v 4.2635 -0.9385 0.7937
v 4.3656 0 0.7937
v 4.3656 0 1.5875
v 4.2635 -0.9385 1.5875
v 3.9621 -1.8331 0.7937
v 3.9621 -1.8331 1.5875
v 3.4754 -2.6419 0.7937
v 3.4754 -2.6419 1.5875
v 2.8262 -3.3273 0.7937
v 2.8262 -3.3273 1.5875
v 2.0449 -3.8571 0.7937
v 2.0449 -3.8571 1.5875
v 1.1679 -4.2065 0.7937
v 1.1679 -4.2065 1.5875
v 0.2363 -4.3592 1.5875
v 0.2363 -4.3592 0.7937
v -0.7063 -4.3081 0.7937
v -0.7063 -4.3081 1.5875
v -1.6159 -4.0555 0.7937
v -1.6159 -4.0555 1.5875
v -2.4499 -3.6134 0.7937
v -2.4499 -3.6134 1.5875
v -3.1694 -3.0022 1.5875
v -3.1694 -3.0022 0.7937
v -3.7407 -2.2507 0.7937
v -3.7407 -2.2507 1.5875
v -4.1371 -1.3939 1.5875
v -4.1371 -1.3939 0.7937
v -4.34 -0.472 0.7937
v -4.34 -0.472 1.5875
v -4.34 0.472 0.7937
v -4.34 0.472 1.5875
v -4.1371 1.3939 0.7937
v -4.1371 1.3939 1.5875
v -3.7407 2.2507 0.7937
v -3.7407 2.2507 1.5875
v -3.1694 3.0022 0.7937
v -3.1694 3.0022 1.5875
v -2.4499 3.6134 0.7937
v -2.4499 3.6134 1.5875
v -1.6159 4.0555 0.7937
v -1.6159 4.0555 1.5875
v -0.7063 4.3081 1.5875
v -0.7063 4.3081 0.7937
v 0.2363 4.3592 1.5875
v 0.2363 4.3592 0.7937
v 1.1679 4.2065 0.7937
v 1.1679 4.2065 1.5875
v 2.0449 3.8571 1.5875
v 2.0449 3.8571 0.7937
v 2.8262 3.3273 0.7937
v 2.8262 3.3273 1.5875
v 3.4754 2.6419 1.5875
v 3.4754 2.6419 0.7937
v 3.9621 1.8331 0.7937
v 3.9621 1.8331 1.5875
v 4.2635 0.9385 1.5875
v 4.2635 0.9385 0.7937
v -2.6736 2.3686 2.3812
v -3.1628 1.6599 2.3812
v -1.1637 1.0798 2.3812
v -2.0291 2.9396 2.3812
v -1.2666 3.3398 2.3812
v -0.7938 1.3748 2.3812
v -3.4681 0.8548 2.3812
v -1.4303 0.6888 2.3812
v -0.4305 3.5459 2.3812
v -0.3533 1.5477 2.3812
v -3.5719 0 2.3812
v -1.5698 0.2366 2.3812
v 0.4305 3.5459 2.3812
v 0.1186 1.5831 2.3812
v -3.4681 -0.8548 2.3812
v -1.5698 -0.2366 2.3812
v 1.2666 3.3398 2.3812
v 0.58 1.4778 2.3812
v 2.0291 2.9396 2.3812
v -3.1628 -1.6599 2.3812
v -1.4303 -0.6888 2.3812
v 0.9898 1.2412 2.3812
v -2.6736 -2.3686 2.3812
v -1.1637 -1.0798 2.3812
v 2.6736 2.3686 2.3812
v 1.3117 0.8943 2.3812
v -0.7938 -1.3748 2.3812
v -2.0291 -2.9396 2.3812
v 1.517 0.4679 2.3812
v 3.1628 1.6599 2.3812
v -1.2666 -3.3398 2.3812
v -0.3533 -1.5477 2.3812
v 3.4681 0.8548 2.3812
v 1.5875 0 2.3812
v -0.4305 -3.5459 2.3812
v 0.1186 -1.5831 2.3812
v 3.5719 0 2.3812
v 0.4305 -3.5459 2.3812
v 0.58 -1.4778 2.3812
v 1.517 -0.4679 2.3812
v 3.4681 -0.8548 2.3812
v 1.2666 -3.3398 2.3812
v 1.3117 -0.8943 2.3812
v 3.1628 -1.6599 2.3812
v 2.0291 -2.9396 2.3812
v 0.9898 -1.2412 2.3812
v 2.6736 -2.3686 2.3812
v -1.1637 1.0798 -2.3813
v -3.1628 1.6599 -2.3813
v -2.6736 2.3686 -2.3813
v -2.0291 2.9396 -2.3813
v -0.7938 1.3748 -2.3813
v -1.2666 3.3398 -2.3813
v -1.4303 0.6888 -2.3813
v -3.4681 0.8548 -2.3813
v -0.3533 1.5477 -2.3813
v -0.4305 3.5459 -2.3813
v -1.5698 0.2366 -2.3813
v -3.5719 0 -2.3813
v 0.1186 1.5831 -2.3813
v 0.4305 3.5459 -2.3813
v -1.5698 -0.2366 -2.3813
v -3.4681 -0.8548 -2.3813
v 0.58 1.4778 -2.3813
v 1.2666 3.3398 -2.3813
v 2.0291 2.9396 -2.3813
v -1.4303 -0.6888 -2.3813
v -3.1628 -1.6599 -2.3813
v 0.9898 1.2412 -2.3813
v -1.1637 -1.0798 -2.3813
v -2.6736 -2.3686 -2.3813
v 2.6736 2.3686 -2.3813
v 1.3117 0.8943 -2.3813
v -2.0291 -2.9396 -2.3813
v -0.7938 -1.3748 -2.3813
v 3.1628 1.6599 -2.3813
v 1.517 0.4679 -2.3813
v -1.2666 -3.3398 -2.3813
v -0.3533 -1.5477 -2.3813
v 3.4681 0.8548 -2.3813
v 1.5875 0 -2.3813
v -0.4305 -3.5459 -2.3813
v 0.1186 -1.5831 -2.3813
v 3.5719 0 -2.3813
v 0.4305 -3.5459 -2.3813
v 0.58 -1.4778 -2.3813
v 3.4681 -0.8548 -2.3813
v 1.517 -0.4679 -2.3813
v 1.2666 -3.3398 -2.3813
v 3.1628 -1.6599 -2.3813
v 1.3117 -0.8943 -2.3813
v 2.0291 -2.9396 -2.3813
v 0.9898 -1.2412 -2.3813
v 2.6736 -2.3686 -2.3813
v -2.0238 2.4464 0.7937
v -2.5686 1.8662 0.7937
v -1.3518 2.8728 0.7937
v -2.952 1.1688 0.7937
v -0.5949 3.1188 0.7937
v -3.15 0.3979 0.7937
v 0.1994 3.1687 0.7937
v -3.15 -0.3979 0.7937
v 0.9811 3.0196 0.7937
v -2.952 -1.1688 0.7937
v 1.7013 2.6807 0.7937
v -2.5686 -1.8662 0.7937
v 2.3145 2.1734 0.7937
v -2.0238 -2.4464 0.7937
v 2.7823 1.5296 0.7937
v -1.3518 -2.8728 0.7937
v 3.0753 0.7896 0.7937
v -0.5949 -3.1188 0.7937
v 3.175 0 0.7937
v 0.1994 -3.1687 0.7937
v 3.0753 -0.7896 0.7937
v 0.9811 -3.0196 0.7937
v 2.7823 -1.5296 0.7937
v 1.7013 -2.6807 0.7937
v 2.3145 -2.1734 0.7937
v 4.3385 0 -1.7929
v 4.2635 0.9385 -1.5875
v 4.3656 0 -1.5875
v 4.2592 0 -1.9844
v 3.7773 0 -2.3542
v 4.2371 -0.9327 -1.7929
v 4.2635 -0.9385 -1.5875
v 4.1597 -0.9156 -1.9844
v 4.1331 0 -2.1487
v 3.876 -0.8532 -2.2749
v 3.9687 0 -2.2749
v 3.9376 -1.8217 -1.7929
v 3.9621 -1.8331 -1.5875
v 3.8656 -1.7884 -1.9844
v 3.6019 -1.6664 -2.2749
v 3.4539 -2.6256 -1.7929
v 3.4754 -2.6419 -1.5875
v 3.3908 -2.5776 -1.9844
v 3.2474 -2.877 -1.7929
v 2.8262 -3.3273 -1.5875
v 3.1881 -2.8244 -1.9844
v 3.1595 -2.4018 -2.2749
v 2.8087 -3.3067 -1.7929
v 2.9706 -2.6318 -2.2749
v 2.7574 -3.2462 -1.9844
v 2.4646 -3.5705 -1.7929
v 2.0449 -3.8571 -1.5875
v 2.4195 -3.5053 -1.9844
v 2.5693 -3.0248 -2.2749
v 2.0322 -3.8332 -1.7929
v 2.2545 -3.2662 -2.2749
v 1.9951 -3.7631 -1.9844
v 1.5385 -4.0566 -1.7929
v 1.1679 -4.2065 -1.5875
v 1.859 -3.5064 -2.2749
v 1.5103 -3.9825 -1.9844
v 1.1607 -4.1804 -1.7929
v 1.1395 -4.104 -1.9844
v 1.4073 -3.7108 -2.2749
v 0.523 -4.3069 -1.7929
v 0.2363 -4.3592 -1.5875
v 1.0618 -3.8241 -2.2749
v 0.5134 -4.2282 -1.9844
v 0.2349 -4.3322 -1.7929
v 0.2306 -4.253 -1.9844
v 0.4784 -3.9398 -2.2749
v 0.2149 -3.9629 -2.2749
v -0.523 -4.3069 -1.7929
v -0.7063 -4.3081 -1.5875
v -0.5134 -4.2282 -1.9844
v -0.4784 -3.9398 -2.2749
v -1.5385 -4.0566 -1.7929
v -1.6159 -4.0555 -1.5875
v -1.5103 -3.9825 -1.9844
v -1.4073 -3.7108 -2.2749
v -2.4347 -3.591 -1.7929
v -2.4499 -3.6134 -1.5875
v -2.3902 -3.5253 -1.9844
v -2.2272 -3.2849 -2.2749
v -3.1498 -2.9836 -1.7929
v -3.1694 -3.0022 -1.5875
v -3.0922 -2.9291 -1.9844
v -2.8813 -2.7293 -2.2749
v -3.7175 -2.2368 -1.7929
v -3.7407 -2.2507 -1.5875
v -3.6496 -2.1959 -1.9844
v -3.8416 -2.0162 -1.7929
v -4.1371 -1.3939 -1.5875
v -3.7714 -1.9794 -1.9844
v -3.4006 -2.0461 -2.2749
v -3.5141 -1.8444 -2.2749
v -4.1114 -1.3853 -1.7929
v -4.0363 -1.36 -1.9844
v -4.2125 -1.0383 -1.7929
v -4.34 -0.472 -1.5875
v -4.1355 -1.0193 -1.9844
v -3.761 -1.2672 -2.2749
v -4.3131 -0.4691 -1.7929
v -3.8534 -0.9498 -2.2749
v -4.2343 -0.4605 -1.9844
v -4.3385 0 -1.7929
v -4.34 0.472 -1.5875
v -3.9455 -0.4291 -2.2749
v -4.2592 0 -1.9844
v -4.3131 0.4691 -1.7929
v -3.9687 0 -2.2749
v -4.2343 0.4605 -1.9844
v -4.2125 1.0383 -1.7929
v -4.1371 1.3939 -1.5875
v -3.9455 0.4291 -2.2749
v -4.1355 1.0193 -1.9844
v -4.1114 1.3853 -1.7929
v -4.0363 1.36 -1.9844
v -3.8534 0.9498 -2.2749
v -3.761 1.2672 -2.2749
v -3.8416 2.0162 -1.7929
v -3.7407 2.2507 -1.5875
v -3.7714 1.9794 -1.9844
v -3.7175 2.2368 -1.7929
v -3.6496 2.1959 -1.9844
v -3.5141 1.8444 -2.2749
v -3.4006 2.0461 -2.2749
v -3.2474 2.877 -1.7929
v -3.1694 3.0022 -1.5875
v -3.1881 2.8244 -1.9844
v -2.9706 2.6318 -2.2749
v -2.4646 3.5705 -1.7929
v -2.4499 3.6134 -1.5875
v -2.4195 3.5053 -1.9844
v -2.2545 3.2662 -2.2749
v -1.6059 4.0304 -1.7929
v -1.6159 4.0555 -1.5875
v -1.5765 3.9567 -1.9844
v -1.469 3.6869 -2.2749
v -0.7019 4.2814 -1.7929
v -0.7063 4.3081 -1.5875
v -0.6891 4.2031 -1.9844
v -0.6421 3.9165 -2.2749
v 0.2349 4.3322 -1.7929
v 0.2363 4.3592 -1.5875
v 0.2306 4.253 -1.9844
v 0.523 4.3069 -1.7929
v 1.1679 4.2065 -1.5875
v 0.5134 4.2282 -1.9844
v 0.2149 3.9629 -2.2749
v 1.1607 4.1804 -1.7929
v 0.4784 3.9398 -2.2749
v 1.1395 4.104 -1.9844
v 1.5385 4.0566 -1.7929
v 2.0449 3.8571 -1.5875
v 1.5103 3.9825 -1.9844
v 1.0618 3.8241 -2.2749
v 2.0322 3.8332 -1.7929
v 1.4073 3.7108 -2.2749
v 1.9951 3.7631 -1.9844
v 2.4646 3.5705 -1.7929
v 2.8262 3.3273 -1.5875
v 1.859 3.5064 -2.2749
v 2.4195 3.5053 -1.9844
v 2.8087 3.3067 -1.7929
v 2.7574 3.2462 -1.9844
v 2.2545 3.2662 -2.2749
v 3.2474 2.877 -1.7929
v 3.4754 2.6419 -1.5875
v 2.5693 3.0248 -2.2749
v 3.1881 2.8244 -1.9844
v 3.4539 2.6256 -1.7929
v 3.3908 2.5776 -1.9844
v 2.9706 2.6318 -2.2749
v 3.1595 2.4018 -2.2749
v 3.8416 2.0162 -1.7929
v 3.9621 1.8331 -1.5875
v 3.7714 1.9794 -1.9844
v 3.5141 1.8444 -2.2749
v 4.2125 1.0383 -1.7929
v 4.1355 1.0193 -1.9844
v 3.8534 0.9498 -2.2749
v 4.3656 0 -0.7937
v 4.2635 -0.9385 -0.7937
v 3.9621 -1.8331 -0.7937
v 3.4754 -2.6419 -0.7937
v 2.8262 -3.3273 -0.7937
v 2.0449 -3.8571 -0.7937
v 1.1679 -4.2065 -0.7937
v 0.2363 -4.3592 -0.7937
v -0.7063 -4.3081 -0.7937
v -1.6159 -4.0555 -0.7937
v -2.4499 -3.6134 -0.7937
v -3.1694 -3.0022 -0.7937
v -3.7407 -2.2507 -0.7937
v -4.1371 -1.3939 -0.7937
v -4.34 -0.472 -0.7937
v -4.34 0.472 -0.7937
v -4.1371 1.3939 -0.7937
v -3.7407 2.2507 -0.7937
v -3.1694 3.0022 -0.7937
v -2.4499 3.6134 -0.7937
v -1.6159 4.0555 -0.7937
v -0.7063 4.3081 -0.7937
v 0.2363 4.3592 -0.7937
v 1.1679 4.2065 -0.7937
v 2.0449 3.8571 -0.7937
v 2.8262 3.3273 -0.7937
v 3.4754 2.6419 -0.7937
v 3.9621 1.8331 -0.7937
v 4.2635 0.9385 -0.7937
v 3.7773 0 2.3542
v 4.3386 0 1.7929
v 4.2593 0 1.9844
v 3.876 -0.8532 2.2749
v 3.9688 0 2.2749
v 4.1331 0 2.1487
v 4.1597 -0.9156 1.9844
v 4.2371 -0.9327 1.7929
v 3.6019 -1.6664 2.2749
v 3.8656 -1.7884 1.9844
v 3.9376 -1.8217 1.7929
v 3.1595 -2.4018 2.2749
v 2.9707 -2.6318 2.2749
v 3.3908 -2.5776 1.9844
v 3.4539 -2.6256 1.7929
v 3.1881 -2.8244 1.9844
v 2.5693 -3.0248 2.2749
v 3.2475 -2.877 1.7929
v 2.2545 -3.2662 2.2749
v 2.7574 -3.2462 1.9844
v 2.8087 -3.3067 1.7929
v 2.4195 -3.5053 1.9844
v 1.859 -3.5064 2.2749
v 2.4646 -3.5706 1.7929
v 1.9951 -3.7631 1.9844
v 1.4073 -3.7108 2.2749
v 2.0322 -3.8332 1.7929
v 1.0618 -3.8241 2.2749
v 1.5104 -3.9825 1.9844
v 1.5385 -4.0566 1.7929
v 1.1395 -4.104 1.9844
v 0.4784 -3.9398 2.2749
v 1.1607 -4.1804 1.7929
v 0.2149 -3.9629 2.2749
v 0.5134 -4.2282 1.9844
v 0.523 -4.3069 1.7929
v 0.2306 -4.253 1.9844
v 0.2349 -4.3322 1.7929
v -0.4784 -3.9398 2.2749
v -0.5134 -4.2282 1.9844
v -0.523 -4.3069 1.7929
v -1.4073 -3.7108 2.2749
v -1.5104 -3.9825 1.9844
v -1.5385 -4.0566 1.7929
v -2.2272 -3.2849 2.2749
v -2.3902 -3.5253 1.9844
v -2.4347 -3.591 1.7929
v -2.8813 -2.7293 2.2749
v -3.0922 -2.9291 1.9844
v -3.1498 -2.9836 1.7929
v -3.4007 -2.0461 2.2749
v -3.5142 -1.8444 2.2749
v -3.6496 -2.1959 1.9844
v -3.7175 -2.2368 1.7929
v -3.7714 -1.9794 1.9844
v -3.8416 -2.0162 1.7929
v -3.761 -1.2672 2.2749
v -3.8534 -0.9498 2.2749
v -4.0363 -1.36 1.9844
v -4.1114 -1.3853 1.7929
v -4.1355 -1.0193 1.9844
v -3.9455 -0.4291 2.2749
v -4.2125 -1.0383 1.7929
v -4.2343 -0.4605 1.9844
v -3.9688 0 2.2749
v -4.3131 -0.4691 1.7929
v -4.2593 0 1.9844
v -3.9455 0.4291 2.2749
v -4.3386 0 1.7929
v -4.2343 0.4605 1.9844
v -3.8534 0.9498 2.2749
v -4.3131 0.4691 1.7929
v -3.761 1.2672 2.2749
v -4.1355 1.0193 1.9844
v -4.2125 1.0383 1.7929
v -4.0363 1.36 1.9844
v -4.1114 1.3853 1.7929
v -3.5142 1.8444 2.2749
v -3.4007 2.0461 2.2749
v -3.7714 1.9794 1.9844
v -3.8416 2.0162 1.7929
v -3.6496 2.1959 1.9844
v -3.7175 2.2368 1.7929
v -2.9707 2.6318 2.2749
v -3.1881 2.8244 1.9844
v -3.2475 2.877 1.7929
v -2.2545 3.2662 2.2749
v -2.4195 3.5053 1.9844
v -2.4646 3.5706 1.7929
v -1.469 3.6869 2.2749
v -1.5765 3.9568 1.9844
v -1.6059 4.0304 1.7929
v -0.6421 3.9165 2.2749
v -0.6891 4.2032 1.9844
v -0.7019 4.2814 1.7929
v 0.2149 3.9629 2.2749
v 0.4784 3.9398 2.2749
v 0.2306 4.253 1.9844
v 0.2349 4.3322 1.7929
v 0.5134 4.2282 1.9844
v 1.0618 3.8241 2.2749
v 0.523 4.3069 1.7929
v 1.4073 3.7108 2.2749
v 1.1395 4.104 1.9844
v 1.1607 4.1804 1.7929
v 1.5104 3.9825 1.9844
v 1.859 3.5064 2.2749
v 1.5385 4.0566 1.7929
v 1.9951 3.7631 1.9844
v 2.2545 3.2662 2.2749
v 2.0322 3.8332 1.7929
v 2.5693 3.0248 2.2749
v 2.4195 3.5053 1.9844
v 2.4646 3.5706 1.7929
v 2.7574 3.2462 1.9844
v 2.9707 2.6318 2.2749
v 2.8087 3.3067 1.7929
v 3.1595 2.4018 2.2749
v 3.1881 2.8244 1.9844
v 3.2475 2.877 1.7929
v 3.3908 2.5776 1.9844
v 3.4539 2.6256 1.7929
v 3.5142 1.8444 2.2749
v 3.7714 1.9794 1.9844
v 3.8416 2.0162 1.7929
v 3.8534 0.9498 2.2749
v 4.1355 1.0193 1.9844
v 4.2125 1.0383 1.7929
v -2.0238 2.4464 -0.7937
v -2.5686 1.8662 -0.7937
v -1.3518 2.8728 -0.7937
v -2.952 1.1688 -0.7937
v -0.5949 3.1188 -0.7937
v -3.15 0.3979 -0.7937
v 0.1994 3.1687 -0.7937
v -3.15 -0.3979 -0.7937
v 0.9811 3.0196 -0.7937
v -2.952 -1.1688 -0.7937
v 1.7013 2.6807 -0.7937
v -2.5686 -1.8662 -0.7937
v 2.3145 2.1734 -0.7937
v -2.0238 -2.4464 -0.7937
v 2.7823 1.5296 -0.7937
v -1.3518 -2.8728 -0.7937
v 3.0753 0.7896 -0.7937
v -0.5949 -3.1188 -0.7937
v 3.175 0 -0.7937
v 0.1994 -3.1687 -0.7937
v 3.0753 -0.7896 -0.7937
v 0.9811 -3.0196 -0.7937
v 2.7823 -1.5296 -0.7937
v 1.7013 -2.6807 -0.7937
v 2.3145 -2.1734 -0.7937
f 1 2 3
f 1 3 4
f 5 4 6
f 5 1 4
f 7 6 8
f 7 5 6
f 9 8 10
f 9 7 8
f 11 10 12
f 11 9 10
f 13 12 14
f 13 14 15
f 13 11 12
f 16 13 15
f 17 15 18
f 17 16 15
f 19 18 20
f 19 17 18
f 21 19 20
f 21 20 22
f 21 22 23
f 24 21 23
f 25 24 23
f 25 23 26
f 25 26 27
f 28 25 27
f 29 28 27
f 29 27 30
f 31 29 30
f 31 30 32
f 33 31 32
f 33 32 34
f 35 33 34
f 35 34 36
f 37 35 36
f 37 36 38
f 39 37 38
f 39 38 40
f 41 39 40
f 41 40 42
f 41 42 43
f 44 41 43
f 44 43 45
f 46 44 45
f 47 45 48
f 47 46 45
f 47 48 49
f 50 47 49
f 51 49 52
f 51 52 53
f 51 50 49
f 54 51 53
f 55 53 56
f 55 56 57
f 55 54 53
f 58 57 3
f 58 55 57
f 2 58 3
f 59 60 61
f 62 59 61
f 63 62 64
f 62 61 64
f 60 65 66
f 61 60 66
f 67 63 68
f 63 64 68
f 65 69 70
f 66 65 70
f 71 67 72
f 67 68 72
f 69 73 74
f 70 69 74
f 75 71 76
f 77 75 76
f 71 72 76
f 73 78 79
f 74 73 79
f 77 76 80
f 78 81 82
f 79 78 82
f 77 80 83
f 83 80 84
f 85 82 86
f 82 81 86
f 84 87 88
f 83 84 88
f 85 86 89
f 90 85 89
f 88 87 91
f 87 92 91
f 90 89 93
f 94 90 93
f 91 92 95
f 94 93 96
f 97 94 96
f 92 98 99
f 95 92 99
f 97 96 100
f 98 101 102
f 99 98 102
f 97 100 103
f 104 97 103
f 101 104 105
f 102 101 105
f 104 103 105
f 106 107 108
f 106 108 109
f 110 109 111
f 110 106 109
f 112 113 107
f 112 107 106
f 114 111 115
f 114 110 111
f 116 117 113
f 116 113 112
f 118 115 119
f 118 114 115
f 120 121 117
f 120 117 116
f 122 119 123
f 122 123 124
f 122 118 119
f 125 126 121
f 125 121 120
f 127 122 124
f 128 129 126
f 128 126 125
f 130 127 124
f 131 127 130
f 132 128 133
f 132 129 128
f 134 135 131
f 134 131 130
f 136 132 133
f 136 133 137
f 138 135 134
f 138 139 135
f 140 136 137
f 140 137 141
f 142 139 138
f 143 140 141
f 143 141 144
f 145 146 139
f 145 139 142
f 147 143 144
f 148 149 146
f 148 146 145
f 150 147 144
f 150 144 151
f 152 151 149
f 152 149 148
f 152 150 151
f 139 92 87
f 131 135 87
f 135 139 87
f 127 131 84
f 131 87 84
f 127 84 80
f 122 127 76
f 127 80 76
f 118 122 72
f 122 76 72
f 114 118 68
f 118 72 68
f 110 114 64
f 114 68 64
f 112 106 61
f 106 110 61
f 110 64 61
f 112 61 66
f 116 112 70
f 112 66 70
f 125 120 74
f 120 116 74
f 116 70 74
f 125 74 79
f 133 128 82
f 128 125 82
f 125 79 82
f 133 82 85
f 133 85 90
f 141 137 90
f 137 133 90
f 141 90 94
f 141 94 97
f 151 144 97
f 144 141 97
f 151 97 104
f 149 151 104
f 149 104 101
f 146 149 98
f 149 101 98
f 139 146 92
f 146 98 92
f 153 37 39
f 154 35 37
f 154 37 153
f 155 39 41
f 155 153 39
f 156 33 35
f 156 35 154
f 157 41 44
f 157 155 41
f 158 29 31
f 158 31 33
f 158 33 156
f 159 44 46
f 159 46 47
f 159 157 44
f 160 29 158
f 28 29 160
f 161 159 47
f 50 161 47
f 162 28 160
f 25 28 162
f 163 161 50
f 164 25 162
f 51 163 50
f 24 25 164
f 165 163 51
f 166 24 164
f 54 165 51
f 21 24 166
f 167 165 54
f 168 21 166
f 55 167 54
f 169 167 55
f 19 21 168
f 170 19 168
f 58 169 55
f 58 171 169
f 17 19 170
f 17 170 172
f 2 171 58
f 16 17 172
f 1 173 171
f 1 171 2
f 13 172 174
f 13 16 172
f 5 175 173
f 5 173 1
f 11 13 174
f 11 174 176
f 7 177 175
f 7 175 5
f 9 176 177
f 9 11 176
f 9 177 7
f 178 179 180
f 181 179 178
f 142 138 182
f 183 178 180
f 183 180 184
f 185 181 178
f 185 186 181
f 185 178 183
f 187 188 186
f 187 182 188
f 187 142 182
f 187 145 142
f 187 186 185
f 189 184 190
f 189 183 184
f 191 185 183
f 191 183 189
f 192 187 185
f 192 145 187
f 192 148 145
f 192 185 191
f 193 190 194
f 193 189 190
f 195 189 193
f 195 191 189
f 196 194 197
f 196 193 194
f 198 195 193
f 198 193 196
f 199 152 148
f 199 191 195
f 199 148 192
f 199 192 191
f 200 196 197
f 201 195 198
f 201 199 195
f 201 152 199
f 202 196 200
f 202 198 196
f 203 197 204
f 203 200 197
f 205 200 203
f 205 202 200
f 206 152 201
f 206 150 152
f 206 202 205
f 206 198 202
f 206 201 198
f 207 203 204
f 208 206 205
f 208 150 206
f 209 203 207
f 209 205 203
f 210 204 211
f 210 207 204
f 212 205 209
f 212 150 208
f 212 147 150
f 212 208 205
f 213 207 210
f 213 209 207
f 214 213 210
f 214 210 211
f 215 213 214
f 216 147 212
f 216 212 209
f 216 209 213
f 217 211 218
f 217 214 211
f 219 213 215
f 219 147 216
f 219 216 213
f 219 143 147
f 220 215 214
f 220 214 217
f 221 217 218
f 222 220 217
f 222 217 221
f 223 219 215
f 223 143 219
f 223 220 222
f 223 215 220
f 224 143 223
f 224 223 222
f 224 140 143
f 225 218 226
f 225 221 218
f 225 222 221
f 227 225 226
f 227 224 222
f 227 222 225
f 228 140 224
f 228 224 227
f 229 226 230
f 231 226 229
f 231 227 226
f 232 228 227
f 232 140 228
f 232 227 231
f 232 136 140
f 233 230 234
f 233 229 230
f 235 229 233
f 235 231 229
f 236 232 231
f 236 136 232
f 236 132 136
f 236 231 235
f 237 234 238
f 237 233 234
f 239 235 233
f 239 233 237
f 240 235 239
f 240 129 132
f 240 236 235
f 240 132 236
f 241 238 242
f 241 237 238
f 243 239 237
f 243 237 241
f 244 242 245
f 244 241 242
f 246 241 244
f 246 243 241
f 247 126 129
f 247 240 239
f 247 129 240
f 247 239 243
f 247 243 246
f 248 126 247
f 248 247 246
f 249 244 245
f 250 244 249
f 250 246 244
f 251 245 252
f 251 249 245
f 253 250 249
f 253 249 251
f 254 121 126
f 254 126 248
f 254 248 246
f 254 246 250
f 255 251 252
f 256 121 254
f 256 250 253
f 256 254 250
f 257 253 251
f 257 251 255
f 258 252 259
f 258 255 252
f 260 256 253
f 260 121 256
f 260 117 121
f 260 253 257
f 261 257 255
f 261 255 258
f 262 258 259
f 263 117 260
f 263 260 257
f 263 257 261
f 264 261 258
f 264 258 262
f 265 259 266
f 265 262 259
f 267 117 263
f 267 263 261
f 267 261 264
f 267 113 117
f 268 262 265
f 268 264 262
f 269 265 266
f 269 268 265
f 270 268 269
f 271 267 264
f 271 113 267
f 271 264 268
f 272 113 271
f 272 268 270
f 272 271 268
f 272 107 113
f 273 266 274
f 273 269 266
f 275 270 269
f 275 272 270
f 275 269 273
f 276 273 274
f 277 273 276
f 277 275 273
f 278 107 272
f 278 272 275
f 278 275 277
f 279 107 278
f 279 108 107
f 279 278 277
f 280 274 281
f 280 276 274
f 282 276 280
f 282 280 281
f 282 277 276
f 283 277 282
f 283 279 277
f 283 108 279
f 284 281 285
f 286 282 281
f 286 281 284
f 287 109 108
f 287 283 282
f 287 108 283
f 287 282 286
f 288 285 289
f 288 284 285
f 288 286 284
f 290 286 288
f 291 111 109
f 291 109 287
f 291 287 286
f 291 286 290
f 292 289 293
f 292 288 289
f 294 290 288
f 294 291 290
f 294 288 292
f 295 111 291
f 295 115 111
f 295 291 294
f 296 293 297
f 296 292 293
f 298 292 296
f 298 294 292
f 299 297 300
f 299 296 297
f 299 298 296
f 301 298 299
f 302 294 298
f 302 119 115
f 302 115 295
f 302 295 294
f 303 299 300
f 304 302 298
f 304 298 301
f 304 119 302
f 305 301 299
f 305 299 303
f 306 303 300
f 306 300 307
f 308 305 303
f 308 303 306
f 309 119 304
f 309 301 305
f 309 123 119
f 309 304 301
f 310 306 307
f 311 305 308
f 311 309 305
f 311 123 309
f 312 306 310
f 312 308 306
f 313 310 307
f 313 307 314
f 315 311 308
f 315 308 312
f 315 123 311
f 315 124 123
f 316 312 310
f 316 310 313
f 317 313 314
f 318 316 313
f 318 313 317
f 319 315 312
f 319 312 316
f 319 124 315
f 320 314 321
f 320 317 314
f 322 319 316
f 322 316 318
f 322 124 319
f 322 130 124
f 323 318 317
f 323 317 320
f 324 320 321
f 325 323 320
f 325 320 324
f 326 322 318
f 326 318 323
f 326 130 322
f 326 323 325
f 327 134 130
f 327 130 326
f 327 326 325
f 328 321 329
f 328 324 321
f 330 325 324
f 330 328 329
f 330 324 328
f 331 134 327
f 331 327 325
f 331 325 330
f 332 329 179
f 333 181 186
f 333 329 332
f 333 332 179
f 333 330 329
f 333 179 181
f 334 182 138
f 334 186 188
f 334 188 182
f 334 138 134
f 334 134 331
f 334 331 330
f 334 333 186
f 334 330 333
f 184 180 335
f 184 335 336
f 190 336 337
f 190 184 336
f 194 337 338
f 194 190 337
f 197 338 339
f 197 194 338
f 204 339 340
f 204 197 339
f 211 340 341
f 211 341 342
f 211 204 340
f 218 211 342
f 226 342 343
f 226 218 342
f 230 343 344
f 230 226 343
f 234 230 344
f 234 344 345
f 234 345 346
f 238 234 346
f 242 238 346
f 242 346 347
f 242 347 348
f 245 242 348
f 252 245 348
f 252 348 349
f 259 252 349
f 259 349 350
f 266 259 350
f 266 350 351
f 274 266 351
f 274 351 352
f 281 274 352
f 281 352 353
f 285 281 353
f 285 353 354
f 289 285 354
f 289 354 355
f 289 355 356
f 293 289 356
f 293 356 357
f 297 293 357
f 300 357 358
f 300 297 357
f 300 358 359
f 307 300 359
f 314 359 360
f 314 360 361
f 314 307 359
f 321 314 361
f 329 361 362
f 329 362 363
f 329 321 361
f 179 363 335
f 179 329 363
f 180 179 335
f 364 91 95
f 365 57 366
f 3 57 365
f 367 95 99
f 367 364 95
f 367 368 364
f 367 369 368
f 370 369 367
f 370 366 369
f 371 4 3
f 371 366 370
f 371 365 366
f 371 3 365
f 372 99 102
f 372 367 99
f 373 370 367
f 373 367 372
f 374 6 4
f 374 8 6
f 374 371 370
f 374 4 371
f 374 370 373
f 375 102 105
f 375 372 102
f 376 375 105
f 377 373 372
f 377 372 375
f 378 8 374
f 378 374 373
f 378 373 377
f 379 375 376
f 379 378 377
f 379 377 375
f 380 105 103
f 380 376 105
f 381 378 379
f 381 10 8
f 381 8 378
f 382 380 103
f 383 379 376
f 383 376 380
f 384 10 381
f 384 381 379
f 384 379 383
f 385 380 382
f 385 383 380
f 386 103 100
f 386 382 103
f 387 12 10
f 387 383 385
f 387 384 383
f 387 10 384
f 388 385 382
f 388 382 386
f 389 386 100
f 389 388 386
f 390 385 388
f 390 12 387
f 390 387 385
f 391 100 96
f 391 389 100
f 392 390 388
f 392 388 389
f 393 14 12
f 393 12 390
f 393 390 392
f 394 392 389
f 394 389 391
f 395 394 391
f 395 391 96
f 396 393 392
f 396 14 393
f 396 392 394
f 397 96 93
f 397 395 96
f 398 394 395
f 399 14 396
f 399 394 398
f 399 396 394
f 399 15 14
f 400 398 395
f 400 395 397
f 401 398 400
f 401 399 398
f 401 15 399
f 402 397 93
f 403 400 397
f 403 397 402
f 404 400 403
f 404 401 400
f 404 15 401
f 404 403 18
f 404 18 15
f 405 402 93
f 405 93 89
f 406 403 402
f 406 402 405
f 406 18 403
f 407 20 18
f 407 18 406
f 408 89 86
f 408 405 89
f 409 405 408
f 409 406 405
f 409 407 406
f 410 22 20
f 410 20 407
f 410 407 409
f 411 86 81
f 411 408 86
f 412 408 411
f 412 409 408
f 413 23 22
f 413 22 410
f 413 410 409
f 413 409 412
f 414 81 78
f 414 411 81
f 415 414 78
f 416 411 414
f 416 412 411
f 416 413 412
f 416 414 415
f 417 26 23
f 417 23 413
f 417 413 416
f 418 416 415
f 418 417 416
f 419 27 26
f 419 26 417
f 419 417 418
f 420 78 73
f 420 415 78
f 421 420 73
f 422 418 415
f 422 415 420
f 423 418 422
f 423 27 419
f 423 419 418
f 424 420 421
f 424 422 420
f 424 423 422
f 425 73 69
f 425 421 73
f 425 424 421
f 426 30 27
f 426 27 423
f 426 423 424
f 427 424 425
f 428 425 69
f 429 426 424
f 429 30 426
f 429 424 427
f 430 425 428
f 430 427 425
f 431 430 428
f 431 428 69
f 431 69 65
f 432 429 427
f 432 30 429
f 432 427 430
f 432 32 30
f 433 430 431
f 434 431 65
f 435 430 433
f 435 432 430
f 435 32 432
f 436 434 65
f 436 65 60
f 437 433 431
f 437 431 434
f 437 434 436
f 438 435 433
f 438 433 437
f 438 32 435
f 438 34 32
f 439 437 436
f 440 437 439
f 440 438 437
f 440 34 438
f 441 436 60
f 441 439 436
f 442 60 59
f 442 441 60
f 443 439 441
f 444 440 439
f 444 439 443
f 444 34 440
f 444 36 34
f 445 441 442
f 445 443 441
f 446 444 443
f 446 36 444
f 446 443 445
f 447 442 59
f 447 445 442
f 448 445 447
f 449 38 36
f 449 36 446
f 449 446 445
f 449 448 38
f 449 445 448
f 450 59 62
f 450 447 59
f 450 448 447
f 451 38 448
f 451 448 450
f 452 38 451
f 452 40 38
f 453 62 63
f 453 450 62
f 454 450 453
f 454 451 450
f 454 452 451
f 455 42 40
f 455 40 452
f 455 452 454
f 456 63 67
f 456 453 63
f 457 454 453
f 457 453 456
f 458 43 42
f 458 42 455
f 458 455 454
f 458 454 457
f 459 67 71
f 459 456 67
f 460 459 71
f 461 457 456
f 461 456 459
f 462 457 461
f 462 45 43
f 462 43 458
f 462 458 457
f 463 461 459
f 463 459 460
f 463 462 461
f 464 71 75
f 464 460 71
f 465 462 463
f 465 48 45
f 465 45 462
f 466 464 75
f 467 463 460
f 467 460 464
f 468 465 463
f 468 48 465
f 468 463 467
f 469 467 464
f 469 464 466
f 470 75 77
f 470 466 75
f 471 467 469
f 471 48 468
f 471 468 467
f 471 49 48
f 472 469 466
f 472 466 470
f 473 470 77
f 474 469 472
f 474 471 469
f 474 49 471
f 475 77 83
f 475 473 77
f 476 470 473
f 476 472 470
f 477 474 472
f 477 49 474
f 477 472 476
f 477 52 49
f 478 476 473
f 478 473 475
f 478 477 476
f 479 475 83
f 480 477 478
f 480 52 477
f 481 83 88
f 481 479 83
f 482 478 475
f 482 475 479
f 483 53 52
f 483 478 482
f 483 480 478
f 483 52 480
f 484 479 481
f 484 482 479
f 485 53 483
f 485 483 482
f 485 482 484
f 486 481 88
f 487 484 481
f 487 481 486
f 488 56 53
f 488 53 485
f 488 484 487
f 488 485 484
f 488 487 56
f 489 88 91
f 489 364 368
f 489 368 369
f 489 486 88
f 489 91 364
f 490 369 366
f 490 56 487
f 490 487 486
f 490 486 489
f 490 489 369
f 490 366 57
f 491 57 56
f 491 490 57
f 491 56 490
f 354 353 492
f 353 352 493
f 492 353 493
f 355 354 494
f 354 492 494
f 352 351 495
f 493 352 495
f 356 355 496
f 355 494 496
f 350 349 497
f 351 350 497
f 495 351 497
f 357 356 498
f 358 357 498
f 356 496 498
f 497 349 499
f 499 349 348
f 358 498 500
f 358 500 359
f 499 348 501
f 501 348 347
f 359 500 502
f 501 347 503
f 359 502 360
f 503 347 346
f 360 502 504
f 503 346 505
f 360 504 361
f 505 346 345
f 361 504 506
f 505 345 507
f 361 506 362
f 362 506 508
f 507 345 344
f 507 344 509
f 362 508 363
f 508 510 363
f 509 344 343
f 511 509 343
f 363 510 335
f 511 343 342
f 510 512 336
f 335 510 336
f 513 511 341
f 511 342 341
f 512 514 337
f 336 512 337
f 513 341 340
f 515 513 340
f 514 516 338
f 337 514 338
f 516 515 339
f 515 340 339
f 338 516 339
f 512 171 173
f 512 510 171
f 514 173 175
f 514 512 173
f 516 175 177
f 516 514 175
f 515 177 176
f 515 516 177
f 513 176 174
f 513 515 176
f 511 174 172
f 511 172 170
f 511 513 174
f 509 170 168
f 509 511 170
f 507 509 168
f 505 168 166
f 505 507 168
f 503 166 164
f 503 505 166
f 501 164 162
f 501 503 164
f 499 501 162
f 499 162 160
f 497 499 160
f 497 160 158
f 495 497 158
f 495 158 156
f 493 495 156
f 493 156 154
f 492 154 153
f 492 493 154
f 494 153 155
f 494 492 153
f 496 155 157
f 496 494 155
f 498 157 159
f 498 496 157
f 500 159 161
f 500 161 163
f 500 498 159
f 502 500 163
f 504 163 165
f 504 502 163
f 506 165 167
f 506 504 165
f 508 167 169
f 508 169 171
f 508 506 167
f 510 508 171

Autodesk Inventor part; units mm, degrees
ref_plane "YZ Plane" through (0, 0, 0) normal (1, 0, 0) x (0, 1, 0)
ref_plane "XZ Plane" through (0, 0, 0) normal (0, 1, 0) x (-1, 0, 0)
ref_plane "XY Plane" through (0, 0, 0) normal (0, 0, 1) x (1, 0, 0)
sketch "Skizze2" plane through (0, 0, 0) normal (0, 1, 0) x (-1, 0, 0)
  line L0 (-1.5875, -2.3813) -> (-1.5875, 2.3812)
  line L1 (-1.5875, 2.3812) -> (-3.5719, 2.3812)
  arc A0 (-3.5719, 2.3812) -> (-4.3656, 1.5875) centre (-3.5719, 1.5875) ccw
  line L2 (-4.3656, 1.5875) -> (-4.3656, 0.7937)
  line L3 (-4.3656, 0.7937) -> (-3.175, 0.7937)
  line L4 (-3.175, 0.7937) -> (-3.175, -0.7937)
  line L5 (-3.175, -0.7937) -> (-4.3656, -0.7937)
  line L6 (-4.3656, -0.7937) -> (-4.3656, -1.5875)
  line L7 (-1.5875, -2.3813) -> (-3.5719, -2.3813)
  arc A1 (-4.3656, -1.5875) -> (-3.5719, -2.3813) centre (-3.5719, -1.5875) ccw
  line L8 (0, 2.3813) -> (0, -2.3813)
  line L9 (-5.436, 0) -> (0.906, 0) projected
  point P0 (0, 0)
  point P1 (0, 0)
  dimension "d0" = 3.175
  dimension "d1" = 6.35
  dimension "d2" = 8.7312
  dimension "d3" = 1.5875
  dimension "d4" = 4.7625
  dimension "d5" = 0.7937
revolve "Umdrehung1" add sketch "Skizze2" angle 360 about axis through (0, 0, 2.3813) along (0, 0, -1)
properties part number "Gummitülle 3mm" material "Gummi"
